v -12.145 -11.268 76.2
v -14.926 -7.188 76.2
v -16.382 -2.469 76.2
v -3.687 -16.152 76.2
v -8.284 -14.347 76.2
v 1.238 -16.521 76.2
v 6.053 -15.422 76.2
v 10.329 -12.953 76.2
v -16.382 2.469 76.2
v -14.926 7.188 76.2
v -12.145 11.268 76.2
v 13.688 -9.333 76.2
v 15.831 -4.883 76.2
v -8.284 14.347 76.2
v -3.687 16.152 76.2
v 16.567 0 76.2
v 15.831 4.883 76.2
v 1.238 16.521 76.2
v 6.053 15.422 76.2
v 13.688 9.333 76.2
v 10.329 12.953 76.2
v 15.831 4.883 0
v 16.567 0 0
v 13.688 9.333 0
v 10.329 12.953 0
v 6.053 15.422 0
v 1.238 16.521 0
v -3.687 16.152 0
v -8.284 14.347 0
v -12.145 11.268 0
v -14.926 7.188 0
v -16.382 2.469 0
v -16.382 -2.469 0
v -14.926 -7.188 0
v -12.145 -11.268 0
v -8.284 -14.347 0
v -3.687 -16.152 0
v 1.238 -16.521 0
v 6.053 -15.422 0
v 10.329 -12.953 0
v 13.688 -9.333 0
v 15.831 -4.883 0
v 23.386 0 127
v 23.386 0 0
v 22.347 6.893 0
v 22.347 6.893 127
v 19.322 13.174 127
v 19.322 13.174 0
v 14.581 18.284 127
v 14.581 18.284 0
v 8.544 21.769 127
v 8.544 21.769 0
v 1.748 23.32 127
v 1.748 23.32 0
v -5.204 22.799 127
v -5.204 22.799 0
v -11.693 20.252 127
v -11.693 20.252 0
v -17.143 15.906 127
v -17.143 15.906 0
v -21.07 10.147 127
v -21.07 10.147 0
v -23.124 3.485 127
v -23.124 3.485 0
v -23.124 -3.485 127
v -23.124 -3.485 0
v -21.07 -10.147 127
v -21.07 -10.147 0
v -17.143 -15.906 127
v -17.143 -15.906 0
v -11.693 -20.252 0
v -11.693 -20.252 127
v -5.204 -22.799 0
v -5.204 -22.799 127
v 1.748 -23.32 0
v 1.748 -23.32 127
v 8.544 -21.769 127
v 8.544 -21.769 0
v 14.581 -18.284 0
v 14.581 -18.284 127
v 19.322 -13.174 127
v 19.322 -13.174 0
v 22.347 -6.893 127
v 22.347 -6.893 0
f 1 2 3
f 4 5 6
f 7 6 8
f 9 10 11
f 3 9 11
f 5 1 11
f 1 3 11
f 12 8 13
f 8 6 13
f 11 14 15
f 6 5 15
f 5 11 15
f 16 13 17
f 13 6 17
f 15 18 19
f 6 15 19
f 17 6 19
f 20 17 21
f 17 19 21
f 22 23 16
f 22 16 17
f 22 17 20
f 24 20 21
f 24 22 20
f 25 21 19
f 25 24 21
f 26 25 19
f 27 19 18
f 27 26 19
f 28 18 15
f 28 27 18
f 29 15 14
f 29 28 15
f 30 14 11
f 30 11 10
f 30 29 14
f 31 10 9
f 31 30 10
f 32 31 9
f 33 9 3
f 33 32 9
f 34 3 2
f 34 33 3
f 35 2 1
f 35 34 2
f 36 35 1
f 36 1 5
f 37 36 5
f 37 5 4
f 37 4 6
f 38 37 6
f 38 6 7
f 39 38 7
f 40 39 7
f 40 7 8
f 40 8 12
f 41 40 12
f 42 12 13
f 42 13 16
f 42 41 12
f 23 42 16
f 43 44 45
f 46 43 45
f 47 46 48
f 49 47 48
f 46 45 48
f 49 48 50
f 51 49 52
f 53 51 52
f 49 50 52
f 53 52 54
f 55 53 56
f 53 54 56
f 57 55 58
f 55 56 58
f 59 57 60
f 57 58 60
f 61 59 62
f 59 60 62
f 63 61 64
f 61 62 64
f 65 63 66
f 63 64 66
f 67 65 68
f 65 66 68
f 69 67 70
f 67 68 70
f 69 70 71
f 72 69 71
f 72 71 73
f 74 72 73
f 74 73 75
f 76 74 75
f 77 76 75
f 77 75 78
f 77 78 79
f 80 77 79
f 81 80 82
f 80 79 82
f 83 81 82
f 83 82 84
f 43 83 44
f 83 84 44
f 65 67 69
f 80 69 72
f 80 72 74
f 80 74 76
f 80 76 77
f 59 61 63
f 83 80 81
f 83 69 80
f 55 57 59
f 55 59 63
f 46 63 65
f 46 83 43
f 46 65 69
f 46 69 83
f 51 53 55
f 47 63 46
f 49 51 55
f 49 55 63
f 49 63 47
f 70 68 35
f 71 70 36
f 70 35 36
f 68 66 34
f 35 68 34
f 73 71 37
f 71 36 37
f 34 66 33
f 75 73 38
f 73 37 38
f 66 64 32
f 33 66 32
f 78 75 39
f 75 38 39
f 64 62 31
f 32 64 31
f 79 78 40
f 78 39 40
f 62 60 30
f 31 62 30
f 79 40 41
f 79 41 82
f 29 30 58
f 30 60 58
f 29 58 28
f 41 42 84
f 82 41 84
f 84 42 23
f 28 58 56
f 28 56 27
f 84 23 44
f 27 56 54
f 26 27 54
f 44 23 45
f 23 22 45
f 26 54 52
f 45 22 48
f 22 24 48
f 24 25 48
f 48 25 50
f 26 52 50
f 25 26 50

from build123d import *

# Parameters (mm, degrees)
F0_R     = 23.385551
F1_DEPTH = 127
F2_R     = 16.56705
F3_DEPTH = 76.2


with BuildPart() as f1:
    # F0 (on Top) → F1 (new body)
    with BuildSketch(Plane.XY):
        Circle(F0_R)
    extrude(amount=F1_DEPTH)


with BuildPart() as f3:
    # F2 (on Top) → F3 (new body)
    with BuildSketch(Plane.XY):
        Circle(F2_R)
    extrude(amount=F3_DEPTH)


with BuildPart() as f1_1:
    add(f1.part)

    # F4: cut F3
    add(f3.part, mode=Mode.SUBTRACT)


solid = f1_1.part
